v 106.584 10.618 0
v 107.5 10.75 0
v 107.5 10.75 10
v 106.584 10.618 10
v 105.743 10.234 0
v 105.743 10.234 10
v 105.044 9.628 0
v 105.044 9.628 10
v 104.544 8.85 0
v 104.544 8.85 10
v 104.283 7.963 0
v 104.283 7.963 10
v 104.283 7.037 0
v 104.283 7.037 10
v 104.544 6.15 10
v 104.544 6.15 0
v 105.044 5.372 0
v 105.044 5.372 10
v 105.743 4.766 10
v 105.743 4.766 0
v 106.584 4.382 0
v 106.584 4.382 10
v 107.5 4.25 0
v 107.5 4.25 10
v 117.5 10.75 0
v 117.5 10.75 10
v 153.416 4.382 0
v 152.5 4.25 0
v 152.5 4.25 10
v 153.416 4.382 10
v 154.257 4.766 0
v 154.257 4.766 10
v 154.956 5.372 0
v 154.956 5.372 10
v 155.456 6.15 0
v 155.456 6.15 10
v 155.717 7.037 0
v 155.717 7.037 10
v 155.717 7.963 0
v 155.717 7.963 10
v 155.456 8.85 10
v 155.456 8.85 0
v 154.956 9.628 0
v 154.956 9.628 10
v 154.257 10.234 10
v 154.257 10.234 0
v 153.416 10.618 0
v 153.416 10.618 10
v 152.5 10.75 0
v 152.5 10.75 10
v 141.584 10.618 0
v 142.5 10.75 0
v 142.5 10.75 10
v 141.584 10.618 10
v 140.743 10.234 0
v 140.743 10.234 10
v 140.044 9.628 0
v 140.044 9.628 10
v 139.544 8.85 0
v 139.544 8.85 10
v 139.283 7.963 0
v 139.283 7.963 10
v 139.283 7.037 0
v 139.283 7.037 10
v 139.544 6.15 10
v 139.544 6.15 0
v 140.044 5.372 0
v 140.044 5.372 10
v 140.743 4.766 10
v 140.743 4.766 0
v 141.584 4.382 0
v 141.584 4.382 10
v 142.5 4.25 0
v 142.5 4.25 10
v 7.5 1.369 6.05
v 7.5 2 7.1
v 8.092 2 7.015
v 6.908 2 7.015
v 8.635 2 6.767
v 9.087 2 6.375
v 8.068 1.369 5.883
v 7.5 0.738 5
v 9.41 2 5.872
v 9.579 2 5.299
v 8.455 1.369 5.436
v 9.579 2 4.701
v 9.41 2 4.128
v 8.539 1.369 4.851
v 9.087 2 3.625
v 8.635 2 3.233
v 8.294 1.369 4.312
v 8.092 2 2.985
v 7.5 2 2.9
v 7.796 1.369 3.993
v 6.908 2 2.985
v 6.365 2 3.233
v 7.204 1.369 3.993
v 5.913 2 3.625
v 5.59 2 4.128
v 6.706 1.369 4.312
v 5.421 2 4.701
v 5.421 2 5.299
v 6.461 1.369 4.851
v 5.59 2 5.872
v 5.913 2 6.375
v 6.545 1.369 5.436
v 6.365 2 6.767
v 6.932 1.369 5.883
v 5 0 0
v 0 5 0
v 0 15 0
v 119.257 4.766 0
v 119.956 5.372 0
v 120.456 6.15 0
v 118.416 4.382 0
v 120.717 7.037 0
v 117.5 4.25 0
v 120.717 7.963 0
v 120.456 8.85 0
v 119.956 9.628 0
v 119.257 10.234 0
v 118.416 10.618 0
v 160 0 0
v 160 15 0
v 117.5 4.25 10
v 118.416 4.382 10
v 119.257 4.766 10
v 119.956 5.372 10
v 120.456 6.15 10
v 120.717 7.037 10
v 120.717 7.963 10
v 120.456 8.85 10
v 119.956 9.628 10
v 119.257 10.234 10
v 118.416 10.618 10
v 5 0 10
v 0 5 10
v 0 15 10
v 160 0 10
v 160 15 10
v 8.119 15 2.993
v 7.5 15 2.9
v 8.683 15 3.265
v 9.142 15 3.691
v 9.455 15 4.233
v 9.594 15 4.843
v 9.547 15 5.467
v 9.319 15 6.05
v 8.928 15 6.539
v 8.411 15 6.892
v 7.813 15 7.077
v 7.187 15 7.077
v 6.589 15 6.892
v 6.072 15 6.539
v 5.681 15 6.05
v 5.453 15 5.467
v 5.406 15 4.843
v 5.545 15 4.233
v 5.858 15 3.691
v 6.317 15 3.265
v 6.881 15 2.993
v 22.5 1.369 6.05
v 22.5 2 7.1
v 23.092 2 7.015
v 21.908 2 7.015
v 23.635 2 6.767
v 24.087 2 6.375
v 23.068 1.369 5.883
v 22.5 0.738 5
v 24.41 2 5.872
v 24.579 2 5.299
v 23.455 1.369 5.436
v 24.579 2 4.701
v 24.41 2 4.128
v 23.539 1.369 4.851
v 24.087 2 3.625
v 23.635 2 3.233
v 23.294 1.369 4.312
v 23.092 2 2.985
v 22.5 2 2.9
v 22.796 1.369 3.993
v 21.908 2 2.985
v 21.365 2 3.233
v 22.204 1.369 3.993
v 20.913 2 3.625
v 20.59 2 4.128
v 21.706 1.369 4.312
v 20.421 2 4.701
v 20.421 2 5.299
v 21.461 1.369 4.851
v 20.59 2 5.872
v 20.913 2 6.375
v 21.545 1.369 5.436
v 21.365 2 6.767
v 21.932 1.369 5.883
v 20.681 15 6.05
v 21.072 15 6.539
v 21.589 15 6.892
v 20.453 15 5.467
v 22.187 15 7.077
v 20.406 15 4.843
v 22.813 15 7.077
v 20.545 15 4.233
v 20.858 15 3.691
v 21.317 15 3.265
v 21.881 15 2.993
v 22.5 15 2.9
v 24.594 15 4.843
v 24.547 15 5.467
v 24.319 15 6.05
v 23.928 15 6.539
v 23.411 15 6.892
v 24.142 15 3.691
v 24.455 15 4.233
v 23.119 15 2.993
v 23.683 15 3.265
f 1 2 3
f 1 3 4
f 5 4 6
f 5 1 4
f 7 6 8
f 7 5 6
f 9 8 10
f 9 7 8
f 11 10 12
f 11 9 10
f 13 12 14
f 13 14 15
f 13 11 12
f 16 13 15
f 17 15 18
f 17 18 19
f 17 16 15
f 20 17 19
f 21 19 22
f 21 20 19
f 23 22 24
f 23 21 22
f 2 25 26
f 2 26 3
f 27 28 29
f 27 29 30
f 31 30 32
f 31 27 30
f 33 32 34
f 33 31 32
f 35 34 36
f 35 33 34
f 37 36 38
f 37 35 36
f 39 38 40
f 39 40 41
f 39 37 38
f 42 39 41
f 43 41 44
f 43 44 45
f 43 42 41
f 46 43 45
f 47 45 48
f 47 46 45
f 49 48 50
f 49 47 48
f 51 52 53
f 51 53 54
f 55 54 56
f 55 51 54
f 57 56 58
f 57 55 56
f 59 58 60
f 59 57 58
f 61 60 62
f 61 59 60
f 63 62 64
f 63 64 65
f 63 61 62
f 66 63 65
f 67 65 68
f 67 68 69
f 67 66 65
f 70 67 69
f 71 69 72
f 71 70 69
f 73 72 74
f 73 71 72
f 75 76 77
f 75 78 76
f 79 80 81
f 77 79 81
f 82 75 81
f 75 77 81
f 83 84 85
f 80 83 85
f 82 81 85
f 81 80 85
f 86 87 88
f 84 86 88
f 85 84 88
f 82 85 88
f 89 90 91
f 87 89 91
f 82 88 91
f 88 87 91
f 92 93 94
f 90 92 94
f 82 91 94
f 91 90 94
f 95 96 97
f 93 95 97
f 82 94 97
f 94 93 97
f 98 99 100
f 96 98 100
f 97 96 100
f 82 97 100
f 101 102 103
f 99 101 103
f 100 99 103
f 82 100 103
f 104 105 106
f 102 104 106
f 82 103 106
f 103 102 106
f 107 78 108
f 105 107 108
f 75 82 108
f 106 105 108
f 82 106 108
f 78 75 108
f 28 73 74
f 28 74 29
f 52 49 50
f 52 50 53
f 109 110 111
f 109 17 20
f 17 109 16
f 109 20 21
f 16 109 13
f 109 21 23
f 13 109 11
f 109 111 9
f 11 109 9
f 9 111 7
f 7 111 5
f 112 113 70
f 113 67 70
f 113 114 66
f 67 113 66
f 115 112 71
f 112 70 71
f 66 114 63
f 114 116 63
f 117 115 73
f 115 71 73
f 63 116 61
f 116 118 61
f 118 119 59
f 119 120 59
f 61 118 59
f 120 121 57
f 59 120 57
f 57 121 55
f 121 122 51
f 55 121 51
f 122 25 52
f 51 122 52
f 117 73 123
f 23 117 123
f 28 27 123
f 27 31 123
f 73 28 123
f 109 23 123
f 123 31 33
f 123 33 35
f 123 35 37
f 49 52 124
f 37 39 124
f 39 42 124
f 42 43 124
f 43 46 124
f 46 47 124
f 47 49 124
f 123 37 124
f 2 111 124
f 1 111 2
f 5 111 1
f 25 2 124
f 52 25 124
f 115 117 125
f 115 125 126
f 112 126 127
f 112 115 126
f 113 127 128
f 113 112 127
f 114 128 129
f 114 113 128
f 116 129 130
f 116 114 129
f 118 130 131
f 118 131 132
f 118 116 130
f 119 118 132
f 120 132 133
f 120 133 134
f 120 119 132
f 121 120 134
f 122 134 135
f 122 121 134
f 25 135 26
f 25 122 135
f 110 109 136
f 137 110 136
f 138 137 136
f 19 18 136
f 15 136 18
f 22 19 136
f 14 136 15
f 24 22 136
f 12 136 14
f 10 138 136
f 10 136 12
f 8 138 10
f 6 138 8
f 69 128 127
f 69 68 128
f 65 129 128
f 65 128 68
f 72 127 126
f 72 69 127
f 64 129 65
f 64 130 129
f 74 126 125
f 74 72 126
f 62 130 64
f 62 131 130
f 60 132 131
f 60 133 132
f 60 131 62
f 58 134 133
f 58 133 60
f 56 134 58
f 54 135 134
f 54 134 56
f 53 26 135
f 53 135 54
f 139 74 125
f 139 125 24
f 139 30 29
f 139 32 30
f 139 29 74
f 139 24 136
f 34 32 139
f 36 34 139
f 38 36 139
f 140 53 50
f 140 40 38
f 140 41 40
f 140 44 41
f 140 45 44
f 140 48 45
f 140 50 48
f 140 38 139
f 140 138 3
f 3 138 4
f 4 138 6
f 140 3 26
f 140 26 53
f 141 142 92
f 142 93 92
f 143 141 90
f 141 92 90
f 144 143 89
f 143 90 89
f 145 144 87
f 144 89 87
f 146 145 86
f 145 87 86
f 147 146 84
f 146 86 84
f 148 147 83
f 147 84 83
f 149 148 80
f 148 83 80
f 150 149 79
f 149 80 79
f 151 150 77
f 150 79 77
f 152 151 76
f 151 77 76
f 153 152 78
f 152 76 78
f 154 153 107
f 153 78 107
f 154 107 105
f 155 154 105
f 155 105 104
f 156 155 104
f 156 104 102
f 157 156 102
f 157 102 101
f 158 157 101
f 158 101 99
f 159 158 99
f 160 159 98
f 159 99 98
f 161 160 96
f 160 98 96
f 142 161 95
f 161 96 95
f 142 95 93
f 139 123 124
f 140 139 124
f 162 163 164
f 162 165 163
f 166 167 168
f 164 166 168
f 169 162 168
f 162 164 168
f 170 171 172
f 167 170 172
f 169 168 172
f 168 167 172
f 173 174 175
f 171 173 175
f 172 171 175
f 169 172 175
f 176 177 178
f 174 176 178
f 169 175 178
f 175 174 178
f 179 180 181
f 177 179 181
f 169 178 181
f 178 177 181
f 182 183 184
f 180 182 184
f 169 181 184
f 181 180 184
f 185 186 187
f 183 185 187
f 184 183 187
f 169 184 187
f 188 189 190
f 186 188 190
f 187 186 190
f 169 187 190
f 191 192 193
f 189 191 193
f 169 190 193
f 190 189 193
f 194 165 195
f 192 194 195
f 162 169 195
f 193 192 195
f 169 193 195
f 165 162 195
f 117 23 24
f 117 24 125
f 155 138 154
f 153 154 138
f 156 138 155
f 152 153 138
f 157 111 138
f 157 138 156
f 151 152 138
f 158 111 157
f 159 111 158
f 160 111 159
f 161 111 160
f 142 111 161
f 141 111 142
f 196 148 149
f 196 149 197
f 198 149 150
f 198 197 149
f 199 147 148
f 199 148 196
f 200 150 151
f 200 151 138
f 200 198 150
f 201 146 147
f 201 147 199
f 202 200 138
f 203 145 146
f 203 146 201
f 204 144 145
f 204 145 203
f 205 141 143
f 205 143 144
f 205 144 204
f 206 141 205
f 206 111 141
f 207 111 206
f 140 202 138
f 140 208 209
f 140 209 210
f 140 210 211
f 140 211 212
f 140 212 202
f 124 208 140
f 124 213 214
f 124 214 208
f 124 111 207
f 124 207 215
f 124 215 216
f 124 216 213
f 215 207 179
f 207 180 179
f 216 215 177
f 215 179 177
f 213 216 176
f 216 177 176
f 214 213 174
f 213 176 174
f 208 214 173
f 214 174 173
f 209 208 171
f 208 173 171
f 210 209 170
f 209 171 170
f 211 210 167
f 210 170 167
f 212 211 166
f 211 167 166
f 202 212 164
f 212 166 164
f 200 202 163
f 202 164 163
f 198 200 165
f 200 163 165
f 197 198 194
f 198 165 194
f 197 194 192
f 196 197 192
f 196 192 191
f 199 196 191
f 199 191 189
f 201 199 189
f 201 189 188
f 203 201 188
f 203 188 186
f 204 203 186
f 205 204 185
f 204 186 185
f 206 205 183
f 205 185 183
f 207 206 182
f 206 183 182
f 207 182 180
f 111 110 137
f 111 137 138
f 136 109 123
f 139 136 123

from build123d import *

# Parameters (mm, degrees)
SKETCH_1_W             = 160
SKETCH_1_H             = 15
EXTRUDE_1_DEPTH        = 10
HOLE_WIZARD_M5_1_D     = 4.2
HOLE_WIZARD_M5_1_DEPTH = 13
HOLE_WIZARD_M5_1_TIP   = 1.2618073
CHAMFER_1_SIZE         = 5
CUT_EXTRUDE_1_DEPTH    = 10


with BuildPart() as part:
    # 草图1 → 凸台-拉伸1 (new body)
    with BuildSketch(Plane.XY):
        with Locations((80, 7.5)):
            Rectangle(SKETCH_1_W, SKETCH_1_H)
    extrude(amount=EXTRUDE_1_DEPTH)

    # M5 螺纹孔1
    with Locations(Plane(origin=(7.5, 15, 5), x_dir=(0, 0, 1), z_dir=(0, 1, 0))):
        with Locations((0, 0), (0, 15)):
            Hole(HOLE_WIZARD_M5_1_D / 2, depth=HOLE_WIZARD_M5_1_DEPTH)
            with Locations((0, 0, -(HOLE_WIZARD_M5_1_DEPTH + HOLE_WIZARD_M5_1_TIP / 2))):  # 118° drill point
                Cone(0, HOLE_WIZARD_M5_1_D / 2, HOLE_WIZARD_M5_1_TIP, mode=Mode.SUBTRACT)

    # 倒角1
    chamfer_1_edges = [part.edges().sort_by_distance(p)[0] for p in [
        (0, 0, 5),
    ]]
    chamfer(chamfer_1_edges, length=CHAMFER_1_SIZE)

    # 草图4 → 切除-拉伸1 (cut)
    with BuildSketch(Plane(origin=(0, 0, 0), x_dir=(-1, 0, 0), z_dir=(0, 0, -1))):
        with BuildLine():
            Line((-152.5, 10.75), (-142.5, 10.75))
            ThreePointArc((-142.5, 10.75), (-139.25, 7.5), (-142.5, 4.25))
            Line((-142.5, 4.25), (-152.5, 4.25))
            ThreePointArc((-152.5, 4.25), (-155.75, 7.5), (-152.5, 10.75))
        make_face()
        with BuildLine():
            Line((-117.5, 10.75), (-107.5, 10.75))
            ThreePointArc((-107.5, 10.75), (-104.25, 7.5), (-107.5, 4.25))
            Line((-107.5, 4.25), (-117.5, 4.25))
            ThreePointArc((-117.5, 4.25), (-120.75, 7.5), (-117.5, 10.75))
        make_face()
    extrude(amount=-CUT_EXTRUDE_1_DEPTH, mode=Mode.SUBTRACT)


solid = part.part
